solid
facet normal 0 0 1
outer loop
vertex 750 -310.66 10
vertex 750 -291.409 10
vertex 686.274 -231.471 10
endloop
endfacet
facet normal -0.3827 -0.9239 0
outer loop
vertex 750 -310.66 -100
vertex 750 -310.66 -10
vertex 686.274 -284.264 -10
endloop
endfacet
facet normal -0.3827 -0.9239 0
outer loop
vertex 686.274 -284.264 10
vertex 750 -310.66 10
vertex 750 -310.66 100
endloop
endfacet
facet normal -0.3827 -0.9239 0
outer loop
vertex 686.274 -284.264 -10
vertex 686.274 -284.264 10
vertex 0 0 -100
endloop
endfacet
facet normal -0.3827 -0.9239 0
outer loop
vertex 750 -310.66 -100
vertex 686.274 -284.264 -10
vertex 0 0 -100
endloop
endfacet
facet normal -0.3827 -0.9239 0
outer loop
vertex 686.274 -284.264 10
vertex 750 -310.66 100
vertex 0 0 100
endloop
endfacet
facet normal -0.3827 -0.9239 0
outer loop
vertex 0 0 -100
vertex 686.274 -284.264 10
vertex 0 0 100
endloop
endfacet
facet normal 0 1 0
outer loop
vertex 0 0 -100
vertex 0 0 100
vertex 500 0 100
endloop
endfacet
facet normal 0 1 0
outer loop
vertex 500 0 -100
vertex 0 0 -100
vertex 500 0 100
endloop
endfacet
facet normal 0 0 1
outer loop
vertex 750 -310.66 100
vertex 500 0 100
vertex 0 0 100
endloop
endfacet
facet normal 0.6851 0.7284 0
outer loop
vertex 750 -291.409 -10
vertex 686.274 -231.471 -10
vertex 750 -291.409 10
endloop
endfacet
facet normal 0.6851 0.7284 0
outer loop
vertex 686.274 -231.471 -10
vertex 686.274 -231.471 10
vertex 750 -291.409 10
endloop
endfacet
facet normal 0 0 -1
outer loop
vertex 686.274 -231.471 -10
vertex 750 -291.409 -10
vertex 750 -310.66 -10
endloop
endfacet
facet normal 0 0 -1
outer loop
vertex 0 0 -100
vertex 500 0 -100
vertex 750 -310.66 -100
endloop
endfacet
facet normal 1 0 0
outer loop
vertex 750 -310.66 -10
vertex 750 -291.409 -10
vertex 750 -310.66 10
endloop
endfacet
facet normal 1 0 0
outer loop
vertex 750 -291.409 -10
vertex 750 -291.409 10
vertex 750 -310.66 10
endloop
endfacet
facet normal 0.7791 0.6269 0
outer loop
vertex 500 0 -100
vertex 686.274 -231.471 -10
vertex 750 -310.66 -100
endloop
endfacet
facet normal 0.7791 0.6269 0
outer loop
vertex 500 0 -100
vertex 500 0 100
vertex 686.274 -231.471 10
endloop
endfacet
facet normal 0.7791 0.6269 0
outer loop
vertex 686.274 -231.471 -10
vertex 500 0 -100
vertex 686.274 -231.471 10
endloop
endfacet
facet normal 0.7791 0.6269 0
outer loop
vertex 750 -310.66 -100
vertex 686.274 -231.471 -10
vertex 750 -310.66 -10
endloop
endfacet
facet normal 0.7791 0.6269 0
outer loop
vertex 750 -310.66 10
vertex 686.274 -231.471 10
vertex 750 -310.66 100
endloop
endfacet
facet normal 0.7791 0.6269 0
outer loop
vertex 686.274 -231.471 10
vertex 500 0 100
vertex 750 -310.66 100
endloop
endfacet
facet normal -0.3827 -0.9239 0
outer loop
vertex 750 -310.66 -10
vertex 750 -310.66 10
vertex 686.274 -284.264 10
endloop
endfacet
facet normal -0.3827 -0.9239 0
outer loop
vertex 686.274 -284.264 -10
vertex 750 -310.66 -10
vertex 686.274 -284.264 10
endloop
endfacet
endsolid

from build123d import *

# Parameters (mm, degrees)
BOSS_EXTRUDE1_DEPTH = 100
BOSS_EXTRUDE2_DEPTH = 10


with BuildPart() as part:
    # Sketch1 → Boss-Extrude1 (new, symmetric)
    with BuildSketch(Plane.XY):
        Polygon((0, 0), (500, 0), (750, -310.66017178), align=None)
    extrude(amount=BOSS_EXTRUDE1_DEPTH, both=True)

    # Sketch2 → Boss-Extrude2 (add, symmetric)
    with BuildSketch(Plane.XY):
        Polygon((686.273799006, -284.263915049), (686.273799006, -231.471401589), (750, -291.408761965), (750, -310.66017178), align=None)
    extrude(amount=BOSS_EXTRUDE2_DEPTH, both=True)


solid = part.part
